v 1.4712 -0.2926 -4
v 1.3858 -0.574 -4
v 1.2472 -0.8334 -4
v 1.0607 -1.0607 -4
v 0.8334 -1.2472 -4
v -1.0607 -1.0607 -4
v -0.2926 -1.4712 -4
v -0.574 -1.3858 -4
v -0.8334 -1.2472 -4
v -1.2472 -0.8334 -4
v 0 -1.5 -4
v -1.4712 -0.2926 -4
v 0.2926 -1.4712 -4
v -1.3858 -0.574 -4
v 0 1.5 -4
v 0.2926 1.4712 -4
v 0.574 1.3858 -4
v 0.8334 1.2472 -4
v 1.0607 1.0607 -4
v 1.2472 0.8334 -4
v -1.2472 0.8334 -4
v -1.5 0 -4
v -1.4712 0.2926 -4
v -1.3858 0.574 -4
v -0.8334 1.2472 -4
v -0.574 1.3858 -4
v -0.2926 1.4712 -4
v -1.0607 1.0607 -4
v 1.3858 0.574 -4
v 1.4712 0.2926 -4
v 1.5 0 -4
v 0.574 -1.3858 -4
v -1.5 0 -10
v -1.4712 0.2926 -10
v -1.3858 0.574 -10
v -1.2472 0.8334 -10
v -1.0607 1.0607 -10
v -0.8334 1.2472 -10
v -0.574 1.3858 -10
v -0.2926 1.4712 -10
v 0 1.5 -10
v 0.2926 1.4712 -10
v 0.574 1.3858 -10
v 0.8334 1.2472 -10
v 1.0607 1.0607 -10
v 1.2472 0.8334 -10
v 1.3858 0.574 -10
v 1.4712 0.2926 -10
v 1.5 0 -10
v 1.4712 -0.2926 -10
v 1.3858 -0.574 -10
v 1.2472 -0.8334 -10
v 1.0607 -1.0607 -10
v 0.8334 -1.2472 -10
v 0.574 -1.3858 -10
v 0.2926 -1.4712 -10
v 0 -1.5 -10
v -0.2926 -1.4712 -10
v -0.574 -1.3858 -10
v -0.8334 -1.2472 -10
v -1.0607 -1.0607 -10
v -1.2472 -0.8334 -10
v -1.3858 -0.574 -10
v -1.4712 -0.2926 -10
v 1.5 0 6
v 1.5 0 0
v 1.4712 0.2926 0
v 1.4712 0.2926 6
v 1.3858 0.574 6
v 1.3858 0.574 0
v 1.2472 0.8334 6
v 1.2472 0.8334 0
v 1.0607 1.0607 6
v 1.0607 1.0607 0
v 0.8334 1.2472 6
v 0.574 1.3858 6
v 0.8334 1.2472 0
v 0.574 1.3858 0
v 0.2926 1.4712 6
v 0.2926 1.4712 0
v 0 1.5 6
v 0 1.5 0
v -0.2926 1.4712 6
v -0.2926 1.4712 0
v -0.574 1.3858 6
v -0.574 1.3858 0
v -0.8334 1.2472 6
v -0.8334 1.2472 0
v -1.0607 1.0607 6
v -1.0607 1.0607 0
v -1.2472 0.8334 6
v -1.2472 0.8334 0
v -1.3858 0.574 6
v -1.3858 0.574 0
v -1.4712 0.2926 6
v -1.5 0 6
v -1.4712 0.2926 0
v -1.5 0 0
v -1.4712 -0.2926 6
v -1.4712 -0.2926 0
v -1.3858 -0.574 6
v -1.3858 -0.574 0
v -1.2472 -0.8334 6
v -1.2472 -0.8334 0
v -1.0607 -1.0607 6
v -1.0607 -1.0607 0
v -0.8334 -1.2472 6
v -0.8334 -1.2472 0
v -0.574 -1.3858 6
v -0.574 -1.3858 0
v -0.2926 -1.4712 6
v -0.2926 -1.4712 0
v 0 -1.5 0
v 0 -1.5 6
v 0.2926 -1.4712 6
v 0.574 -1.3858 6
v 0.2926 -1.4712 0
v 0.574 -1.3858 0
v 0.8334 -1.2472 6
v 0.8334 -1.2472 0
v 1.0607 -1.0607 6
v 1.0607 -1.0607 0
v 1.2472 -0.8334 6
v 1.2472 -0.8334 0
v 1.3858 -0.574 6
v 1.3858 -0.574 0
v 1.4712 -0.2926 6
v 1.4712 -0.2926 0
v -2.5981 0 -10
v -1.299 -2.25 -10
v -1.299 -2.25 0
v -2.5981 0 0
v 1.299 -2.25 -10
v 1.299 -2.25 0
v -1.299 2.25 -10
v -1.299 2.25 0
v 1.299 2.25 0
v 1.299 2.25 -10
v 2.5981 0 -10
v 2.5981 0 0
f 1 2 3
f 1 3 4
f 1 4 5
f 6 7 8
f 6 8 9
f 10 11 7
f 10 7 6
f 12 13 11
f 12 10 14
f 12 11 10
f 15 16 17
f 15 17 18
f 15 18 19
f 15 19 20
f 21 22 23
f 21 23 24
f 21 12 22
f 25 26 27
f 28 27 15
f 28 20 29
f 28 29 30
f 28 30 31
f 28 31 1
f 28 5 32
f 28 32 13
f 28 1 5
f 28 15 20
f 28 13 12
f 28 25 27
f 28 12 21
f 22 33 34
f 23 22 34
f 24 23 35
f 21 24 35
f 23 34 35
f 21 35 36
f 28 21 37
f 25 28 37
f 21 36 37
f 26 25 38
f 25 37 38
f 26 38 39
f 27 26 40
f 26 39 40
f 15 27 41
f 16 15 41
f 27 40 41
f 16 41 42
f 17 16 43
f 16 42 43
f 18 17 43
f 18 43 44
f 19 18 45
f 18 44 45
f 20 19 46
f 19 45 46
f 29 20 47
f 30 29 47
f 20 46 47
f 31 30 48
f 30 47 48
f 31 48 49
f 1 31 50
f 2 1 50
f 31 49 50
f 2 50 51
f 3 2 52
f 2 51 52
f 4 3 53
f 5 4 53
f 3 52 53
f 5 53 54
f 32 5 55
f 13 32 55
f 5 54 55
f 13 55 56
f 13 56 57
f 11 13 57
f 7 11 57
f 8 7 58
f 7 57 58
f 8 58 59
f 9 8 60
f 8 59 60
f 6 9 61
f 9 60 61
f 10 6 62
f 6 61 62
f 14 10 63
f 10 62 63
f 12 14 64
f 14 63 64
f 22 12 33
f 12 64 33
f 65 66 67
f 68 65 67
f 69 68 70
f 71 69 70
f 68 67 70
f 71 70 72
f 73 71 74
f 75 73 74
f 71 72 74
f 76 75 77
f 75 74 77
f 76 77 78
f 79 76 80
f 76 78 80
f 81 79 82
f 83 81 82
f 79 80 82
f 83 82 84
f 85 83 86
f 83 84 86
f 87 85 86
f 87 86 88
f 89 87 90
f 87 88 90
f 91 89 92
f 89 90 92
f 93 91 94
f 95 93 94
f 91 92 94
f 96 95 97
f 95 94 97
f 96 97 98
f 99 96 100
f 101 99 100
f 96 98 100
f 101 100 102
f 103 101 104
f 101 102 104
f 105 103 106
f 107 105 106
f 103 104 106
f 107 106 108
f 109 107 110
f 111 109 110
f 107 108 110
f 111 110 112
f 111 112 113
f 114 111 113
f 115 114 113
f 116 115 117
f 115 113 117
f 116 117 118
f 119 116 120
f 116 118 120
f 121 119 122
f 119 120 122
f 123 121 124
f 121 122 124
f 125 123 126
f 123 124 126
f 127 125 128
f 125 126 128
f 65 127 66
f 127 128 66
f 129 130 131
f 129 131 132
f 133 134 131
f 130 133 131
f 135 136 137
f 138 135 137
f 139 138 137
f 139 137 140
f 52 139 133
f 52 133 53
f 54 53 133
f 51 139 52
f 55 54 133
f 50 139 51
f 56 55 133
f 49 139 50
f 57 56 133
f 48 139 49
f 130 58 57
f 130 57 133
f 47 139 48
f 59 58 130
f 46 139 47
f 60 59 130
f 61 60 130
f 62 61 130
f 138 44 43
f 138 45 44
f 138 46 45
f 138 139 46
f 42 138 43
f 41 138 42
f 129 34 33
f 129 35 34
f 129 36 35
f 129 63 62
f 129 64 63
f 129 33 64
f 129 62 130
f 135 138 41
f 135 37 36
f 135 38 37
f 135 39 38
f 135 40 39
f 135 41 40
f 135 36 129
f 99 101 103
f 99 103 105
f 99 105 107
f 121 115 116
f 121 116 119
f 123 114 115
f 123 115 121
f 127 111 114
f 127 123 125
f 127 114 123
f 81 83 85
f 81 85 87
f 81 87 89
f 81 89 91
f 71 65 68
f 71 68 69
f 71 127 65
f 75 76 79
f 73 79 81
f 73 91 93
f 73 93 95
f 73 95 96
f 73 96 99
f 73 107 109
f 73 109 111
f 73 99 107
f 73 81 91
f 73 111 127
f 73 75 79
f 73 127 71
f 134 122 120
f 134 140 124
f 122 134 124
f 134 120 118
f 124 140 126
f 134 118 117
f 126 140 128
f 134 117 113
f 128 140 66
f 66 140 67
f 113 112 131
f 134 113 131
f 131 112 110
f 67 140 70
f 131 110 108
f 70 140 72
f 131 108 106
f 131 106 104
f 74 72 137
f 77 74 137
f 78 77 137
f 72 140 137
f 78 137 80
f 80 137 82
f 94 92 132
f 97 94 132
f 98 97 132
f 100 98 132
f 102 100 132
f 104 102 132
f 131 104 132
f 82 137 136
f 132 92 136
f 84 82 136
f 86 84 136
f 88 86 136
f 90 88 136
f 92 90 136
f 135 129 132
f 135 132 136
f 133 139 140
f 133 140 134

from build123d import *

# Parameters (mm, degrees)
SKETCH1_R           = 1.5
BOSS_EXTRUDE1_DEPTH = 6
BOSS_EXTRUDE2_DEPTH = 10
SKETCH3_R           = 1.5
CUT_EXTRUDE1_DEPTH  = 6


with BuildPart() as part:
    # Sketch1 → Boss-Extrude1 (new body)
    with BuildSketch(Plane.XY):
        Circle(SKETCH1_R)
    extrude(amount=BOSS_EXTRUDE1_DEPTH)

    # Sketch2 → Boss-Extrude2 (add)
    with BuildSketch(Plane(origin=(0, 0, 0), x_dir=(-1, 0, 0), z_dir=(0, 0, -1))):
        Polygon((1.299038106, 2.25), (-1.299038106, 2.25), (-2.598076211, 0), (-1.299038106, -2.25), (1.299038106, -2.25), (2.598076211, 0), align=None)
    extrude(amount=BOSS_EXTRUDE2_DEPTH)

    # Sketch3 → Cut-Extrude1 (cut)
    with BuildSketch(Plane(origin=(0, 0, -10), x_dir=(-1, 0, 0), z_dir=(0, 0, -1))):
        Circle(SKETCH3_R)
    extrude(amount=-CUT_EXTRUDE1_DEPTH, mode=Mode.SUBTRACT)


solid = part.part
